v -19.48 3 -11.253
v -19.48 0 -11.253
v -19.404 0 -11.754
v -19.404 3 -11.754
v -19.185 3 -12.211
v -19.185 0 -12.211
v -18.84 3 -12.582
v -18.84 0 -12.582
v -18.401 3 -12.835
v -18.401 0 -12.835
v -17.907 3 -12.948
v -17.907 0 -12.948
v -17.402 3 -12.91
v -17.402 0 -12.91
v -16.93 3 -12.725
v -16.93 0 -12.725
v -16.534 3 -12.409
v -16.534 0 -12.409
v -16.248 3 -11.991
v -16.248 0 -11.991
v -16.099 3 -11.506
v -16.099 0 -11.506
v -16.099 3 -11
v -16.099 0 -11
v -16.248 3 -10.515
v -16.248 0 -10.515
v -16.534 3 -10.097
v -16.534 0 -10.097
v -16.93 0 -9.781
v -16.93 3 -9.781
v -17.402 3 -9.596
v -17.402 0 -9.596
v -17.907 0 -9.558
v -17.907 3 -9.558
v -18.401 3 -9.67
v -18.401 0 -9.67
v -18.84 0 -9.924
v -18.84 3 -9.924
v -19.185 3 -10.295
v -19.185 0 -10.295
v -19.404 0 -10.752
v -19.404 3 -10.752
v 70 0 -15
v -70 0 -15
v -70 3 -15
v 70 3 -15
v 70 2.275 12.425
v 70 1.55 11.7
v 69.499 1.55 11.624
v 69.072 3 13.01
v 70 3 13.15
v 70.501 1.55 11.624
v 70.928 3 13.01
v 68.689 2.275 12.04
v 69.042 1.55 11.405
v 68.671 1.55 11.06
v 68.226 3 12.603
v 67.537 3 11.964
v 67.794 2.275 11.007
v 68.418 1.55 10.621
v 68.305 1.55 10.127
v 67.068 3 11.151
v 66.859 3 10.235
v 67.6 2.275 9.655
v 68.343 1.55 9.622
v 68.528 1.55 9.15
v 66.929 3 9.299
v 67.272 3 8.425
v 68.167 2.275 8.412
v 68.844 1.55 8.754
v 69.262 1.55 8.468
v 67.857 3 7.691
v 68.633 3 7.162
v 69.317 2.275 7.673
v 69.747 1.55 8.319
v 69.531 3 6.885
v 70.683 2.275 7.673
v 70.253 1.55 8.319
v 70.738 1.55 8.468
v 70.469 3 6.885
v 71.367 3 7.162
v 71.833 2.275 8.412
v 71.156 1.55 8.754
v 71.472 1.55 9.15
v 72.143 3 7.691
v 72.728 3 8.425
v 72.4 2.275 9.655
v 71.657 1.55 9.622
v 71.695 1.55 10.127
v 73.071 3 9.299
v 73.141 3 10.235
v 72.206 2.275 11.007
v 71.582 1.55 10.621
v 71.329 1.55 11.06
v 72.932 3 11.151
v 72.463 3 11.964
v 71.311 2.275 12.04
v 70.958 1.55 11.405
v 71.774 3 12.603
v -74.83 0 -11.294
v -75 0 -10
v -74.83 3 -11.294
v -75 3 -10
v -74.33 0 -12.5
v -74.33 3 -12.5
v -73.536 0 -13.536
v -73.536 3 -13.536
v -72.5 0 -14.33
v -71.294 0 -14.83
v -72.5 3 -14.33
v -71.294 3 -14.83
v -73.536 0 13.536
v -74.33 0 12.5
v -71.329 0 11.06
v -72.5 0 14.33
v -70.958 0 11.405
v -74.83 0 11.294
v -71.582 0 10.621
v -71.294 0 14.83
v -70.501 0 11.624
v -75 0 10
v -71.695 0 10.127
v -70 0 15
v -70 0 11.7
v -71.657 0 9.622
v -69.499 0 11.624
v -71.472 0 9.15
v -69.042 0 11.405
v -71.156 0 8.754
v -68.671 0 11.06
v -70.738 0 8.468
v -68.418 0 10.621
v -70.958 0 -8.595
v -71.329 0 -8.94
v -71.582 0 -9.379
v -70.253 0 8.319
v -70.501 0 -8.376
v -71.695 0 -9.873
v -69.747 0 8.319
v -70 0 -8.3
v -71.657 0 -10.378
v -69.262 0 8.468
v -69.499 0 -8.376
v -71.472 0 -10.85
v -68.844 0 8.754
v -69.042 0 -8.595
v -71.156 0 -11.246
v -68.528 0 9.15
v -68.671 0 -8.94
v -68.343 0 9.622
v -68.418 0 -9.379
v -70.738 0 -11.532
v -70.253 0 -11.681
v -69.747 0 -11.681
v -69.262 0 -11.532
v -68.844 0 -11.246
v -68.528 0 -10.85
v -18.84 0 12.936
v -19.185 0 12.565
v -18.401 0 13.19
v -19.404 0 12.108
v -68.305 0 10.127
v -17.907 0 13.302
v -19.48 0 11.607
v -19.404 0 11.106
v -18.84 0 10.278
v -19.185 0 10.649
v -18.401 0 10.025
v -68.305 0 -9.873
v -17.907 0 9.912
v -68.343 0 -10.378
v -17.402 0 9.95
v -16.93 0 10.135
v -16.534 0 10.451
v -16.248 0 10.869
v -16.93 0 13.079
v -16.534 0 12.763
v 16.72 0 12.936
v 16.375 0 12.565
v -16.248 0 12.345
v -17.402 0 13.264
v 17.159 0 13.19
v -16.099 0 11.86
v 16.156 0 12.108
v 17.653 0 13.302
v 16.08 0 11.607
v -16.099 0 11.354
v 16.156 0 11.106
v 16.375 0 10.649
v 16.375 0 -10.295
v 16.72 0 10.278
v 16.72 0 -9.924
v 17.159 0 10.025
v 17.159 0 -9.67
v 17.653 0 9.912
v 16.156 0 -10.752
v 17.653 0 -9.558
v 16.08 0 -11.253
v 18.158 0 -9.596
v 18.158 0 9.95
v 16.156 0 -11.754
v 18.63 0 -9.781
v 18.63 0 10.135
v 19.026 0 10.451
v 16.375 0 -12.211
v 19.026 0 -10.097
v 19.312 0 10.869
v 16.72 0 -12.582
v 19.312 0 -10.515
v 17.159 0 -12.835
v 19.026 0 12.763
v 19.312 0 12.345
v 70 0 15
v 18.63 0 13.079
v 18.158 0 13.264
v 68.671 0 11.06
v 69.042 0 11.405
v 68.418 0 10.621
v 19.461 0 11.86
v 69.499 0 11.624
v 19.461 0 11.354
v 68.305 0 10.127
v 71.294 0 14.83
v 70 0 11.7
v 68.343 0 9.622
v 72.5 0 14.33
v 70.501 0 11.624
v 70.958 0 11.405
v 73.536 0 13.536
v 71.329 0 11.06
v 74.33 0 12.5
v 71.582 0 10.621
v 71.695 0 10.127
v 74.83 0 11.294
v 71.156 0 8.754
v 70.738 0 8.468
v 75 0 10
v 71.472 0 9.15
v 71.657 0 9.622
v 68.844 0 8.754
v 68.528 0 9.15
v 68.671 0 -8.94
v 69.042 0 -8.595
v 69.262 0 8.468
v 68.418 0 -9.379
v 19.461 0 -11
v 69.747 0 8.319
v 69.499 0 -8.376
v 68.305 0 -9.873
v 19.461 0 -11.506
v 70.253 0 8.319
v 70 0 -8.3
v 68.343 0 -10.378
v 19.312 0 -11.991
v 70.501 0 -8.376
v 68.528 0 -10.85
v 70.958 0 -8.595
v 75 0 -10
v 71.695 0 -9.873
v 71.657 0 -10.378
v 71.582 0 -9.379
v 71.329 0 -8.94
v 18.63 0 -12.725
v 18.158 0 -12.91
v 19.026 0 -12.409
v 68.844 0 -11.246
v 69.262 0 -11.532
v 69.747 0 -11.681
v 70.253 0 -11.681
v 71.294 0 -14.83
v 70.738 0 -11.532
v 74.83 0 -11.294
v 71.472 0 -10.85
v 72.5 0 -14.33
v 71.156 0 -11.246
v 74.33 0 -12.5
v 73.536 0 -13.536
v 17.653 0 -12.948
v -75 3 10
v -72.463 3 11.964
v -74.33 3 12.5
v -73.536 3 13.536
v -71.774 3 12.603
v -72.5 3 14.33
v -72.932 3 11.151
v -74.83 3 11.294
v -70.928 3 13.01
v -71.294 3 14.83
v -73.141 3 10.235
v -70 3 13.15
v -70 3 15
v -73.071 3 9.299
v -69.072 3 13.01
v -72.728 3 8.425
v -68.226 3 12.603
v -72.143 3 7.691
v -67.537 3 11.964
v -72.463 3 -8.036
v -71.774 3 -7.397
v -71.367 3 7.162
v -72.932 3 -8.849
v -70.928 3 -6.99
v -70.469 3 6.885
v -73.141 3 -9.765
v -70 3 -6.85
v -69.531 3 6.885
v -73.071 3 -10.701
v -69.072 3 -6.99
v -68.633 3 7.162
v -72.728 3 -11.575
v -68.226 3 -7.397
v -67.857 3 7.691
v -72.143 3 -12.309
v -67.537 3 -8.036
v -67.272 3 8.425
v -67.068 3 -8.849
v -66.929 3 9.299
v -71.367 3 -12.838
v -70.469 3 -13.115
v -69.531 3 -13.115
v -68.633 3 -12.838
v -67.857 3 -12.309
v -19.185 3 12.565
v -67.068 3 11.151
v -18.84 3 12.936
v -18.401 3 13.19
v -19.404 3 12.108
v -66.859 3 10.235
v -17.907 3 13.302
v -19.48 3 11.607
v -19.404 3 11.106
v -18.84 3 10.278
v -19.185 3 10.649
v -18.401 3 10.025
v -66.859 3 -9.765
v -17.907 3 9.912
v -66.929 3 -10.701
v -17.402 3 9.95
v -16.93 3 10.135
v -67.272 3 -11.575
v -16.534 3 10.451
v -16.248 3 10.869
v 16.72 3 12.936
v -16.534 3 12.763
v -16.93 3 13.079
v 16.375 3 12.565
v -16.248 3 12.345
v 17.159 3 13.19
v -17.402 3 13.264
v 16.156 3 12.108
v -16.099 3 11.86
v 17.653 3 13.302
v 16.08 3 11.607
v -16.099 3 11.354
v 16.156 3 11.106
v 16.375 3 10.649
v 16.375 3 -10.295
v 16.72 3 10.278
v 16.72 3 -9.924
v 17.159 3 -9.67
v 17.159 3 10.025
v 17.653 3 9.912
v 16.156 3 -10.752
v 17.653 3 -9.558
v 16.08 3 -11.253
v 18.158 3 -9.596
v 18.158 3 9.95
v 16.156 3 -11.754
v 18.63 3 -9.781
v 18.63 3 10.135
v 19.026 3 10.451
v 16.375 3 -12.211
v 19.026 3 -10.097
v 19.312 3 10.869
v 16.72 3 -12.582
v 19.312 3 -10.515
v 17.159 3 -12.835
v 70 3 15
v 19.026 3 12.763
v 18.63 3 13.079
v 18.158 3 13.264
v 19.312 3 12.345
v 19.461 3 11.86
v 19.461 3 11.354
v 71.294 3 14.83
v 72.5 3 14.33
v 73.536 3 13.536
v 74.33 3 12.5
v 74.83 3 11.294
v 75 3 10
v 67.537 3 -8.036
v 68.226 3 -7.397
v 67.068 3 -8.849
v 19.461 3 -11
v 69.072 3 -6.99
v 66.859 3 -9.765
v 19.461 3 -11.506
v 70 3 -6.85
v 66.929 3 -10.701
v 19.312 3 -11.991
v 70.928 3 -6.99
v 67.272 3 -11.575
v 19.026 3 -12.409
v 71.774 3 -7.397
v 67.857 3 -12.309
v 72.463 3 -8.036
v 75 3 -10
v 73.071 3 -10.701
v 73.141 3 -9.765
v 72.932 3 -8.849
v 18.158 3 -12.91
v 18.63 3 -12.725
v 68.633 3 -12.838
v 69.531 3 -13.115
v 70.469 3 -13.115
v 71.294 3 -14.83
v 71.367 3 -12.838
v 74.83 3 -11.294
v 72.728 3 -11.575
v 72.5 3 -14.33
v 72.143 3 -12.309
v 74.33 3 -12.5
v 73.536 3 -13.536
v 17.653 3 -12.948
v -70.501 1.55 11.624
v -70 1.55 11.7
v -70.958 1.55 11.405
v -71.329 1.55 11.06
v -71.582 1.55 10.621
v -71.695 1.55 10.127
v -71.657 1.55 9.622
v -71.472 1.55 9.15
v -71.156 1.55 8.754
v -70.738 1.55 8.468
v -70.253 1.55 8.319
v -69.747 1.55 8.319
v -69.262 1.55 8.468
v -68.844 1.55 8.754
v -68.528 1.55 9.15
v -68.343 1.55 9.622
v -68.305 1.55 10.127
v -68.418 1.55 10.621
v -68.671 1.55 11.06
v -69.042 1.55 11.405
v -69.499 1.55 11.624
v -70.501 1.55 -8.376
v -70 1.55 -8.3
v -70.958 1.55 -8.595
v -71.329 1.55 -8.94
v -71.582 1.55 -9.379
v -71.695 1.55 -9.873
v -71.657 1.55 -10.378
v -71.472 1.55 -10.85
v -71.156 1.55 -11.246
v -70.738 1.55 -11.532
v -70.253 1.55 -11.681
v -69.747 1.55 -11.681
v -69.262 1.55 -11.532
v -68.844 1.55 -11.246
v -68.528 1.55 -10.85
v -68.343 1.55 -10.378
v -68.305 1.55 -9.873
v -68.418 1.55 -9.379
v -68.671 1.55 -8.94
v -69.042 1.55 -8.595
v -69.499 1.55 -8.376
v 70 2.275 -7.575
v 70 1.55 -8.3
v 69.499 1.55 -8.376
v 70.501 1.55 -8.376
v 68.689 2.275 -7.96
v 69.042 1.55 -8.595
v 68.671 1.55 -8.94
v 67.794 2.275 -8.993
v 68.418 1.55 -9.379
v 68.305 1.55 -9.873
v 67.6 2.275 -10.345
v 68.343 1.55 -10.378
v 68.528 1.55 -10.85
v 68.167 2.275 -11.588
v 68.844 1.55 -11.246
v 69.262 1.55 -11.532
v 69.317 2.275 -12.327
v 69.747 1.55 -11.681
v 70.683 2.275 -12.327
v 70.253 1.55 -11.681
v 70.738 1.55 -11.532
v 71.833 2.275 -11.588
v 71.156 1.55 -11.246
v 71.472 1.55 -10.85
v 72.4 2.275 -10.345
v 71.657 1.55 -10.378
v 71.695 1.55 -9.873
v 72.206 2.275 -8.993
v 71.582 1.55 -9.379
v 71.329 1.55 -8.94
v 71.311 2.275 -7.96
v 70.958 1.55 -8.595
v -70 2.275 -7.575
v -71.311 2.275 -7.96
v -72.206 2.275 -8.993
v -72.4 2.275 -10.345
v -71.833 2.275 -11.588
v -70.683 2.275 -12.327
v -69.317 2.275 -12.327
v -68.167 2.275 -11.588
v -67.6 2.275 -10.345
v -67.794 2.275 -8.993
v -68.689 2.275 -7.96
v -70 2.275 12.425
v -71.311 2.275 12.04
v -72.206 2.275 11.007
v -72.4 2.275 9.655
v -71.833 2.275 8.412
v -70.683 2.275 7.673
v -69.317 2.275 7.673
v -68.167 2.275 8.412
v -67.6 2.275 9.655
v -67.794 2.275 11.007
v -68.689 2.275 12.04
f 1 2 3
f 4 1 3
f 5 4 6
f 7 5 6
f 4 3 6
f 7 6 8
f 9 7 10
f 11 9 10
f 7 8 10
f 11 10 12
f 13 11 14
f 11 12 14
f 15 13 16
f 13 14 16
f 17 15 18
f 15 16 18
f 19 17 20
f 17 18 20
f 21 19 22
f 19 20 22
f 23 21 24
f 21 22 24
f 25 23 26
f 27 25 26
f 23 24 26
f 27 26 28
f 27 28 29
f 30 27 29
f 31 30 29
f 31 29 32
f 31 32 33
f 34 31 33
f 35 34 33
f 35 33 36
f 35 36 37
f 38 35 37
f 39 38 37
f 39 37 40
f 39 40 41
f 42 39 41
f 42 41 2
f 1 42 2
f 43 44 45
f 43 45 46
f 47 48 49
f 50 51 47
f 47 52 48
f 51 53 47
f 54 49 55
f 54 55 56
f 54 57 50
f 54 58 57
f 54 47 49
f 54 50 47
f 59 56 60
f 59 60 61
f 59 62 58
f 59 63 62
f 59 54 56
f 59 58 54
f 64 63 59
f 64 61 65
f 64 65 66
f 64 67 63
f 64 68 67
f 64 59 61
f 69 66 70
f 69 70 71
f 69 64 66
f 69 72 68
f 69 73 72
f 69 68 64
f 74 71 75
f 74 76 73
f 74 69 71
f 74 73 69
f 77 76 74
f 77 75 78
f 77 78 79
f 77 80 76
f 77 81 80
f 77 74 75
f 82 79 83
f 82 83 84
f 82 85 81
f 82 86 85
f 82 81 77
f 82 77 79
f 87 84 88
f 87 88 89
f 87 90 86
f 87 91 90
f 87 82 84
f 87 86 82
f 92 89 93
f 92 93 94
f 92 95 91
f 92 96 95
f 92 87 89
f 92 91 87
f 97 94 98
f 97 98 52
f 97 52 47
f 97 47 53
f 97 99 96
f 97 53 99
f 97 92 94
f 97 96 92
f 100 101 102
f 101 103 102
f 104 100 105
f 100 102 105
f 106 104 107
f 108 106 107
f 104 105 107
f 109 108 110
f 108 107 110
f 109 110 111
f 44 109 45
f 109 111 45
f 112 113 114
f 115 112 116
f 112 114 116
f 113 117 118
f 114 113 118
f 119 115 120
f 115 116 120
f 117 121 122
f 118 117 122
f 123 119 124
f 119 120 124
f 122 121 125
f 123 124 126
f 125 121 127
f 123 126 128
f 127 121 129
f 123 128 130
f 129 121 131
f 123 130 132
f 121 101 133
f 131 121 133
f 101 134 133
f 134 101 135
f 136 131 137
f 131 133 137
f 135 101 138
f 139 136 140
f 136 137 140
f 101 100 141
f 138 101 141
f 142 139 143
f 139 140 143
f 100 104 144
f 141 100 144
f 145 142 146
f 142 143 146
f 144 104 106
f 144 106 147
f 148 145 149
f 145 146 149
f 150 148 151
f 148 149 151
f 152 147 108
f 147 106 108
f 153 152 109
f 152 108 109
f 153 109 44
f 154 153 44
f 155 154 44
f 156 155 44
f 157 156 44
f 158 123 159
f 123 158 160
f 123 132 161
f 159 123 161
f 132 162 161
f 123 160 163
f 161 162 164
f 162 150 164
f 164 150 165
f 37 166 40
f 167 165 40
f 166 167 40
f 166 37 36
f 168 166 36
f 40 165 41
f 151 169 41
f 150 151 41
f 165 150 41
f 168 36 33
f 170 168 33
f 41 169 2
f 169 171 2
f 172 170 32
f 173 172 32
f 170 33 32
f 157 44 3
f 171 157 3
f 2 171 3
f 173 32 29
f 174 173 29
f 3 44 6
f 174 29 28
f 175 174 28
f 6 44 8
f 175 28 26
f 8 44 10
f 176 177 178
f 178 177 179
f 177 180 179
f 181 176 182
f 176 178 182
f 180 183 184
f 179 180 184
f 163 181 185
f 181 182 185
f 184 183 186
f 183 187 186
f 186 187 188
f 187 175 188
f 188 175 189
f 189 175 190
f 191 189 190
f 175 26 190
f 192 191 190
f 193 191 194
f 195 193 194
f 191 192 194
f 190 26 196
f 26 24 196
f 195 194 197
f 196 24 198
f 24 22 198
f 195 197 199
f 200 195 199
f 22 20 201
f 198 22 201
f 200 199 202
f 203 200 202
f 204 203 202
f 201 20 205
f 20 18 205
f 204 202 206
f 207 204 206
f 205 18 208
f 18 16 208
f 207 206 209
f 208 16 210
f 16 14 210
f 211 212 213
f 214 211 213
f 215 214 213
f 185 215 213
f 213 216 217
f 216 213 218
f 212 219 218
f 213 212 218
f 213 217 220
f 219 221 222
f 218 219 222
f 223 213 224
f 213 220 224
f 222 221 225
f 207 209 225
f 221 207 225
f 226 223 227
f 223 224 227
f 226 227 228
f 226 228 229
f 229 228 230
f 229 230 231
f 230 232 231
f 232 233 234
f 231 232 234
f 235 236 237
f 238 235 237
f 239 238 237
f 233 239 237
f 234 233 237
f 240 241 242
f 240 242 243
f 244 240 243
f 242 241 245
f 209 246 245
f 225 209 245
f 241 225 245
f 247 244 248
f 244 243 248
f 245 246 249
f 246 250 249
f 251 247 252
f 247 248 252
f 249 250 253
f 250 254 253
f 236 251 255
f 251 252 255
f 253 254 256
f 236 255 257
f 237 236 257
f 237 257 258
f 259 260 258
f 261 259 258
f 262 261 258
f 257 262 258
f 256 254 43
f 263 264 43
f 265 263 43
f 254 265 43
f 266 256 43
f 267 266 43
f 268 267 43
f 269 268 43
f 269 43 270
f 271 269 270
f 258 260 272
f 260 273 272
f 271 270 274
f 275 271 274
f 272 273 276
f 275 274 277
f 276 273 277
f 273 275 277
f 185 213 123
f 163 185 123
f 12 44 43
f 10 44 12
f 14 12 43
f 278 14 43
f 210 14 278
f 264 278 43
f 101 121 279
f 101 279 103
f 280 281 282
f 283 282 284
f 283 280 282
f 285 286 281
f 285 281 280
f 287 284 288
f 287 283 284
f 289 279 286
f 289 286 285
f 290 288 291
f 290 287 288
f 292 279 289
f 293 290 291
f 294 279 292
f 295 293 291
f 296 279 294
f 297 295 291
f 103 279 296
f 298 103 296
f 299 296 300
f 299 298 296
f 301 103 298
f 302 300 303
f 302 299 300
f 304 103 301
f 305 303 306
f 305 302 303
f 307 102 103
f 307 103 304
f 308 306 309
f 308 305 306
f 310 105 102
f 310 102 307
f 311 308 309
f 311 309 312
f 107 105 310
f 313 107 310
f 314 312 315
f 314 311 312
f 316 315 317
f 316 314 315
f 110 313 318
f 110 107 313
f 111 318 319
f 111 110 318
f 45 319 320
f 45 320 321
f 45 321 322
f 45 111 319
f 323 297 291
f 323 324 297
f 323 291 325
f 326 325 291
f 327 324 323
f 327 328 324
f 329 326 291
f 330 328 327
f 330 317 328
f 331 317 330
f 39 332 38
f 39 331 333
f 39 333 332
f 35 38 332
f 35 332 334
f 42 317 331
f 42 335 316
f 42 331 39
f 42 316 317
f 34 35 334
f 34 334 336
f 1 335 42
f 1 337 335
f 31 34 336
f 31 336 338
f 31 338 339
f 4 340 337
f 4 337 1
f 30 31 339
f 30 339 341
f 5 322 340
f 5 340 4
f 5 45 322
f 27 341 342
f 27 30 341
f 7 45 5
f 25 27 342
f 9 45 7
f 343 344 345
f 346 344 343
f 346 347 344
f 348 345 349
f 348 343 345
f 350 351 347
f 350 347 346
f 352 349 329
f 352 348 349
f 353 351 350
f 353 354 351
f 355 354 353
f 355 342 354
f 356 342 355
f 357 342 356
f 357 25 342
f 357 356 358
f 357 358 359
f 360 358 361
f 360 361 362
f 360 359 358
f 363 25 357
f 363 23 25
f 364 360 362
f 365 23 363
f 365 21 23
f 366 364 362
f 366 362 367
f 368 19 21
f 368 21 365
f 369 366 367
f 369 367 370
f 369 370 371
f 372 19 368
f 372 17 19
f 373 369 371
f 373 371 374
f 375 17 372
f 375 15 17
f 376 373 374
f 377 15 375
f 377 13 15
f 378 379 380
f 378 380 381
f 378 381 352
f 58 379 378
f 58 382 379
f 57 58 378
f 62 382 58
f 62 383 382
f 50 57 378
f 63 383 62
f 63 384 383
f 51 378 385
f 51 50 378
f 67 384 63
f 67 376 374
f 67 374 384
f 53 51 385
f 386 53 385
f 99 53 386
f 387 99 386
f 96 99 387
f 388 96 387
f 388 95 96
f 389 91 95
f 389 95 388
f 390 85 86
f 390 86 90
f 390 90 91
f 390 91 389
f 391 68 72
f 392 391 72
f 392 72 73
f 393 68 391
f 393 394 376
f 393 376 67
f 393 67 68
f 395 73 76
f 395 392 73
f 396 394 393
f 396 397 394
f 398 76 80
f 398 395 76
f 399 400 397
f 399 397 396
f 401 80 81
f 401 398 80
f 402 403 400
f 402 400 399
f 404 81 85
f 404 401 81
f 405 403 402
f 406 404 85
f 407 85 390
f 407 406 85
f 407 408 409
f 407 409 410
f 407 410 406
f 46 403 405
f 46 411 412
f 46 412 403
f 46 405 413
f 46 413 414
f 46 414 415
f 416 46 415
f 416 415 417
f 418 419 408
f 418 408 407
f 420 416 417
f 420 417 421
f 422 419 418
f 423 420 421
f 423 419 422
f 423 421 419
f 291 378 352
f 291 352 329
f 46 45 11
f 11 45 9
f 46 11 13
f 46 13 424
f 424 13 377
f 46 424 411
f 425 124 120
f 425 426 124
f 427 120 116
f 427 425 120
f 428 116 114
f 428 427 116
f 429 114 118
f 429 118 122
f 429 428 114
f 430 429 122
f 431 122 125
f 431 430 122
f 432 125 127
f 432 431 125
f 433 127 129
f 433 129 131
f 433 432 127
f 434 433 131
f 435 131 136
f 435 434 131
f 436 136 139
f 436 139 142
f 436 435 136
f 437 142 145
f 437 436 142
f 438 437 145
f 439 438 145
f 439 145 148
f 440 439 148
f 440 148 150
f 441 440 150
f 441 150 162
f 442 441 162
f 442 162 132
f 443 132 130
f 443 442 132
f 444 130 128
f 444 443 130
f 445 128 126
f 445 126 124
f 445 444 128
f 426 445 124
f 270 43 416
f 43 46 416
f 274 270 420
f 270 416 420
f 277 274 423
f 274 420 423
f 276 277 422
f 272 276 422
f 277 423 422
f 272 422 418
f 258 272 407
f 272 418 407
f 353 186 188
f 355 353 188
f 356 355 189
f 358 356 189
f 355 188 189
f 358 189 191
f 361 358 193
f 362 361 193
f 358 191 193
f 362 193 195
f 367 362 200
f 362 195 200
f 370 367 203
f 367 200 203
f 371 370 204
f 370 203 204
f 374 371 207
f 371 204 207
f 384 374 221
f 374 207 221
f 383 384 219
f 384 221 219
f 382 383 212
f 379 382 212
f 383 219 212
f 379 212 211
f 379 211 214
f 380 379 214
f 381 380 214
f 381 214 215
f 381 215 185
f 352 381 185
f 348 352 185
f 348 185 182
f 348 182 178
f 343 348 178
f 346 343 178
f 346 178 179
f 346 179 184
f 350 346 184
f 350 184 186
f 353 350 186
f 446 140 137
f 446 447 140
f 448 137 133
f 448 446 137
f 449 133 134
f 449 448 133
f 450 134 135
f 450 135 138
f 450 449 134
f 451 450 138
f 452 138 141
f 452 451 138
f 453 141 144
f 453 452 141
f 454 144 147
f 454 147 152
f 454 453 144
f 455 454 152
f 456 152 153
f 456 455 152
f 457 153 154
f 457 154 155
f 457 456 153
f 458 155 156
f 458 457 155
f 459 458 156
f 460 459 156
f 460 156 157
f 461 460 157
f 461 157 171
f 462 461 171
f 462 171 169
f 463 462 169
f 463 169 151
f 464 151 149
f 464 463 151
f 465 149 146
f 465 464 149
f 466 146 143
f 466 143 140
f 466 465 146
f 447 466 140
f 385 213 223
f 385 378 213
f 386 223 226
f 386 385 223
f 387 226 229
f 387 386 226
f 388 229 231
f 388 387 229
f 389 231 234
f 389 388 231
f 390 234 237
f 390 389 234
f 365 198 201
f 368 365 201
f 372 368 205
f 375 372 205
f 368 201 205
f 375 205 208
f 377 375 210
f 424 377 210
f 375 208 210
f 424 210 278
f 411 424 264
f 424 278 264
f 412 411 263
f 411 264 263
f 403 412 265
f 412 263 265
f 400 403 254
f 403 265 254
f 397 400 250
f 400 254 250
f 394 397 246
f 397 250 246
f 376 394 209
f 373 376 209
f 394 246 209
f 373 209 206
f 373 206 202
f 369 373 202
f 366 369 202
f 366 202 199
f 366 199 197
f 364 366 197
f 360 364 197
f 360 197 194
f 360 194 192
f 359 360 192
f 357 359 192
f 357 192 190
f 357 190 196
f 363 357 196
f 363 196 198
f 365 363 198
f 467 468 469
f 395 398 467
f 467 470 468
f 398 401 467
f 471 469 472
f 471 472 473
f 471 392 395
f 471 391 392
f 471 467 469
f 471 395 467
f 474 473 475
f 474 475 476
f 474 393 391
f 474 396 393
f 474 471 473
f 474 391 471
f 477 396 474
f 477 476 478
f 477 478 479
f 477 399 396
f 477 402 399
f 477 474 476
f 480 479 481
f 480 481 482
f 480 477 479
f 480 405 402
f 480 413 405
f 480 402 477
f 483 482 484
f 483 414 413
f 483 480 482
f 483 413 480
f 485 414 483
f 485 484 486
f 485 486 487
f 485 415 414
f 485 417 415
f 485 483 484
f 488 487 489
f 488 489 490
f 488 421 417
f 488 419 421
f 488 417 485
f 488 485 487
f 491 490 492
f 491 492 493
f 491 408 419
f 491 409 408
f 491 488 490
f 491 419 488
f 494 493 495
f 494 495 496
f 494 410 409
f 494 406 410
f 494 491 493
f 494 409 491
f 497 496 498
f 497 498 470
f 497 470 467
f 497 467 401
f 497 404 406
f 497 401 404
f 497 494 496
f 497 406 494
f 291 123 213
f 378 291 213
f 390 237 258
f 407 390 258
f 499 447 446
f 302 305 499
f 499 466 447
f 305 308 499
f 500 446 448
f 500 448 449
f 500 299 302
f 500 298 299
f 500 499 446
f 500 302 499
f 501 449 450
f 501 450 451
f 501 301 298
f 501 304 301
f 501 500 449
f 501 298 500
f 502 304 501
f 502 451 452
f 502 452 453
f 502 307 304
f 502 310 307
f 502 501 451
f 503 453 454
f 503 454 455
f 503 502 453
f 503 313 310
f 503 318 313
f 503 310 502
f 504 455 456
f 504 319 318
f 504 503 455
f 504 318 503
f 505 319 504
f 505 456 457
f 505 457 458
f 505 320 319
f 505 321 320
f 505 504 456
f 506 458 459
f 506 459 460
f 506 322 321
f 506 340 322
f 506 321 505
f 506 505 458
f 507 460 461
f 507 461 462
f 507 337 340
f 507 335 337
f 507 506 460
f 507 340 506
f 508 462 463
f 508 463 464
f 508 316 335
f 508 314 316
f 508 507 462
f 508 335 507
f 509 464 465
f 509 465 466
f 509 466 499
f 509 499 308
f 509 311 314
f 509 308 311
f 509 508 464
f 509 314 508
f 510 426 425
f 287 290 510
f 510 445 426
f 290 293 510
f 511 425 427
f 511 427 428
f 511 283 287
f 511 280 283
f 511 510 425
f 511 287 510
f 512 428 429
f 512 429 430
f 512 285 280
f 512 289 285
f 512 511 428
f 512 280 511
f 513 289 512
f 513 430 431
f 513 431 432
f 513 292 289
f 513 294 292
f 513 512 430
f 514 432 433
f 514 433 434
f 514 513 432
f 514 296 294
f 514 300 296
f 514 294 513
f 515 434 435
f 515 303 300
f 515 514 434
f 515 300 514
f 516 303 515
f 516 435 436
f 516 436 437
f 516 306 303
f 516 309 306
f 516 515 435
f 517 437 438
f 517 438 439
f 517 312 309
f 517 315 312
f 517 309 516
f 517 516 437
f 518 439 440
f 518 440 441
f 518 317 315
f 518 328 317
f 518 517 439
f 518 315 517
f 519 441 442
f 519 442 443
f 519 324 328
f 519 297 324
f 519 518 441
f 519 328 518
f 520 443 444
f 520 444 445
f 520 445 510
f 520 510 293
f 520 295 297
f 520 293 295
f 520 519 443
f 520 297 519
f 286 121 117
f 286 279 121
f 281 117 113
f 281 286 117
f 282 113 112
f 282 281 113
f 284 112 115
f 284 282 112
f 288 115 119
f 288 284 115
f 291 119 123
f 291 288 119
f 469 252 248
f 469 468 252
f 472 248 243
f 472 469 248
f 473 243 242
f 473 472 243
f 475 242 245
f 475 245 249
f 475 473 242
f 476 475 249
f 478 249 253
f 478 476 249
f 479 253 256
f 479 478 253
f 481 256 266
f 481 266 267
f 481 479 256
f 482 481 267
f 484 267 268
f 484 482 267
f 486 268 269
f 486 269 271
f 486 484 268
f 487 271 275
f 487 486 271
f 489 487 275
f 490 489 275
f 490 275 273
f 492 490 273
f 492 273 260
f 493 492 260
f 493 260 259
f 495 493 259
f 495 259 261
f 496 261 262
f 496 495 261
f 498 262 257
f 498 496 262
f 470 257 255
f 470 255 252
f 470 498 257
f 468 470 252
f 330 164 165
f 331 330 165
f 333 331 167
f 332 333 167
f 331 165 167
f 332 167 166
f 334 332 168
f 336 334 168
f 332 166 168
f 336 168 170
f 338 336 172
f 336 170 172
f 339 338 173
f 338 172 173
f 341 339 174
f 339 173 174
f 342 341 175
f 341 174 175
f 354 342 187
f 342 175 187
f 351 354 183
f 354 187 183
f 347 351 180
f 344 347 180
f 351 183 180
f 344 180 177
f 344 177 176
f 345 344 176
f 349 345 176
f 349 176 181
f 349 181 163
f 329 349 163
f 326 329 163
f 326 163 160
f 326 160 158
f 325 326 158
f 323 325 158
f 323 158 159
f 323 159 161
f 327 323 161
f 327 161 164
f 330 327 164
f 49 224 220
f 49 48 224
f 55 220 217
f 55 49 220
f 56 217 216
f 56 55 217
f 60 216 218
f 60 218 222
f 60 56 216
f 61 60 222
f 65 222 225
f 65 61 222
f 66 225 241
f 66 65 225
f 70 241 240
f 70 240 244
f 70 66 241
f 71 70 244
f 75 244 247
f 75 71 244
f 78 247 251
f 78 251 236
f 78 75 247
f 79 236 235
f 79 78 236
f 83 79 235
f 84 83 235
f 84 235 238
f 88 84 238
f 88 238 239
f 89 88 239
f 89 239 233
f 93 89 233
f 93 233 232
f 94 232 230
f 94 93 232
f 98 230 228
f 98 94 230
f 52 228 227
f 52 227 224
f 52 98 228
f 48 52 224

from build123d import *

# Parameters (mm, degrees)
SCHIZZO1_W                            = 150
SCHIZZO1_H                            = 30
ESTRUSIONE_ESTRUSIONE1_DEPTH          = 3
FORO_SVASATO_PER_VITE_M3_1_AT_2_COUNT = 2
FORO_SVASATO_PER_VITE_M3_1_AT_2_PITCH = 20
FORO_SVASATO_PER_VITE_M3_1_AT_3_COUNT = 2
FORO_SVASATO_PER_VITE_M3_1_AT_3_PITCH = 141.421356237
FORO_SVASATO_PER_VITE_M3_1_AT_4_COUNT = 2
FORO_SVASATO_PER_VITE_M3_1_AT_4_PITCH = 140
RACCORDO1_R                           = 5
FORO_PER_VITE_M3_1_D                  = 3.4


with BuildPart() as part:
    # Schizzo1 → Estrusione-Estrusione1 (new body)
    with BuildSketch(Plane(origin=(0, 0, 0), x_dir=(1, 0, 0), z_dir=(0, 1, 0))):
        Rectangle(SCHIZZO1_W, SCHIZZO1_H)
    extrude(amount=ESTRUSIONE_ESTRUSIONE1_DEPTH)

    # Schizzo2 → Foro svasato per Vite M3-1 (revolve, cut)
    with BuildSketch(Plane(origin=(-70, 3, -10), x_dir=(0, 0, 1), z_dir=(1, 0, 0))):
        Polygon((0, 0), (0, 3), (1.7, 3), (1.7, 1.45), (3.15, 0), align=None)
    foro_svasato_per_vite_m3_1 = revolve(axis=Axis((-70, 9.35, -10), (0, -1, 0)), mode=Mode.SUBTRACT)

    # Foro svasato per Vite M3-1 at 2: Foro svasato per Vite M3-1 ×2
    with Locations(*[(0, 0, i * FORO_SVASATO_PER_VITE_M3_1_AT_2_PITCH) for i in range(1, FORO_SVASATO_PER_VITE_M3_1_AT_2_COUNT)]):
        add(foro_svasato_per_vite_m3_1, mode=Mode.SUBTRACT)

    # Foro svasato per Vite M3-1 at 3: Foro svasato per Vite M3-1 ×2
    with Locations(*[Vector(0.9899494936611667, 0, 0.1414213562373092) * (i * FORO_SVASATO_PER_VITE_M3_1_AT_3_PITCH) for i in range(1, FORO_SVASATO_PER_VITE_M3_1_AT_3_COUNT)]):
        add(foro_svasato_per_vite_m3_1, mode=Mode.SUBTRACT)

    # Foro svasato per Vite M3-1 at 4: Foro svasato per Vite M3-1 ×2
    with Locations(*[(i * FORO_SVASATO_PER_VITE_M3_1_AT_4_PITCH, 0, 0) for i in range(1, FORO_SVASATO_PER_VITE_M3_1_AT_4_COUNT)]):
        add(foro_svasato_per_vite_m3_1, mode=Mode.SUBTRACT)

    # Raccordo1
    raccordo1_edges = [part.edges().sort_by_distance(p)[0] for p in [
        (-75, 1.5, -15),
        (75, 1.5, -15),
        (75, 1.5, 15),
        (-75, 1.5, 15),
    ]]
    fillet(raccordo1_edges, radius=RACCORDO1_R)

    # Foro per Vite M3-1 (through all)
    with Locations(Plane(origin=(0, 3, 0), x_dir=(1, 0, 0), z_dir=(0, 1, 0))):
        with Locations((17.78, -11.607048139), (-17.78, -11.607048139), (-17.78, 11.252951861), (17.78, 11.252951861)):
            Hole(FORO_PER_VITE_M3_1_D / 2)


solid = part.part
